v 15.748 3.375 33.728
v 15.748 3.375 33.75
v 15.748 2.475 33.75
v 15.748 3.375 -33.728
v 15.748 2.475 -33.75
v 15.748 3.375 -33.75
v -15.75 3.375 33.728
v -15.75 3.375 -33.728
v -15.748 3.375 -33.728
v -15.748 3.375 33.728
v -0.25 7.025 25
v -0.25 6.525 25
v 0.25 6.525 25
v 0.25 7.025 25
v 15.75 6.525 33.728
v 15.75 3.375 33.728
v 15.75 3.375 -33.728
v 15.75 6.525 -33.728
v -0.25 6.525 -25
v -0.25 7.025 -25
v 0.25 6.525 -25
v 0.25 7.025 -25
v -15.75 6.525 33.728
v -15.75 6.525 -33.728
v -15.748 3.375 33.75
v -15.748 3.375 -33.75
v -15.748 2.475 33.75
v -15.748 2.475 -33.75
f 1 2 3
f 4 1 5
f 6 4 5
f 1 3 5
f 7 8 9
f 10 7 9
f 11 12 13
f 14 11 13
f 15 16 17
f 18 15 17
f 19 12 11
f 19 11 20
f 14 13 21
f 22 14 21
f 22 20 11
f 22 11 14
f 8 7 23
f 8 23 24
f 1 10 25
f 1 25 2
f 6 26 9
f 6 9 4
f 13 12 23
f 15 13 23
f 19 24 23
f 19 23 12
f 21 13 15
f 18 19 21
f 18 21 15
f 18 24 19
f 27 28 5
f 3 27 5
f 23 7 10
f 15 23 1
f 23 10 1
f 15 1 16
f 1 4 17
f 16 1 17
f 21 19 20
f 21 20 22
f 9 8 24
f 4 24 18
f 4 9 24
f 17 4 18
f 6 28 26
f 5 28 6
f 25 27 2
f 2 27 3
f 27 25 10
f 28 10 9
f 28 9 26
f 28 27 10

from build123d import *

# Parameters (mm, degrees)
SKETCH1_W           = 69.99
SKETCH1_H           = 150
BOSS_EXTRUDE1_DEPTH = 2
SKETCH2_W           = 70
SKETCH2_H           = 149.9
BOSS_EXTRUDE3_DEPTH = 7
SCALE1_SCALE        = 5
SCALE2_SCALE        = 0.9
SCALE3_SCALE        = 0.1
SKETCH3_W           = 0.5
SKETCH3_H           = 50
BOSS_EXTRUDE4_DEPTH = 0.5


with BuildPart() as part:
    # Sketch1 → Boss-Extrude1 (new body)
    with BuildSketch(Plane(origin=(0, 0, 0), x_dir=(1, 0, 0), z_dir=(0, 1, 0))):
        Rectangle(SKETCH1_W, SKETCH1_H)
    extrude(amount=BOSS_EXTRUDE1_DEPTH)

    # Sketch2 → Boss-Extrude3 (add)
    with BuildSketch(Plane(origin=(0, 2, 0), x_dir=(1, 0, 0), z_dir=(0, 1, 0))):
        Rectangle(SKETCH2_W, SKETCH2_H)
    extrude(amount=BOSS_EXTRUDE3_DEPTH)


with BuildPart() as part_1:
    # Scale1: scaled about (0, 4.499592368, 0)
    add(part.part.scale(SCALE1_SCALE).moved(Location((0, -17.998369472, 0))))


with BuildPart() as part_2:
    # Scale2: scaled about (0, 4.499592369, 0)
    add(part_1.part.scale(SCALE2_SCALE).moved(Location((0, 0.449959237, 0))))


with BuildPart() as part_3:
    # Scale3: scaled about (0, 4.499592369, 0)
    add(part_2.part.scale(SCALE3_SCALE).moved(Location((0, 4.049633132, 0))))

    # Sketch3 → Boss-Extrude4 (add)
    with BuildSketch(Plane(origin=(0, 6.524775803, 0), x_dir=(1, 0, 0), z_dir=(0, 1, 0))):
        Rectangle(SKETCH3_W, SKETCH3_H)
    extrude(amount=BOSS_EXTRUDE4_DEPTH)


solid = part_3.part
